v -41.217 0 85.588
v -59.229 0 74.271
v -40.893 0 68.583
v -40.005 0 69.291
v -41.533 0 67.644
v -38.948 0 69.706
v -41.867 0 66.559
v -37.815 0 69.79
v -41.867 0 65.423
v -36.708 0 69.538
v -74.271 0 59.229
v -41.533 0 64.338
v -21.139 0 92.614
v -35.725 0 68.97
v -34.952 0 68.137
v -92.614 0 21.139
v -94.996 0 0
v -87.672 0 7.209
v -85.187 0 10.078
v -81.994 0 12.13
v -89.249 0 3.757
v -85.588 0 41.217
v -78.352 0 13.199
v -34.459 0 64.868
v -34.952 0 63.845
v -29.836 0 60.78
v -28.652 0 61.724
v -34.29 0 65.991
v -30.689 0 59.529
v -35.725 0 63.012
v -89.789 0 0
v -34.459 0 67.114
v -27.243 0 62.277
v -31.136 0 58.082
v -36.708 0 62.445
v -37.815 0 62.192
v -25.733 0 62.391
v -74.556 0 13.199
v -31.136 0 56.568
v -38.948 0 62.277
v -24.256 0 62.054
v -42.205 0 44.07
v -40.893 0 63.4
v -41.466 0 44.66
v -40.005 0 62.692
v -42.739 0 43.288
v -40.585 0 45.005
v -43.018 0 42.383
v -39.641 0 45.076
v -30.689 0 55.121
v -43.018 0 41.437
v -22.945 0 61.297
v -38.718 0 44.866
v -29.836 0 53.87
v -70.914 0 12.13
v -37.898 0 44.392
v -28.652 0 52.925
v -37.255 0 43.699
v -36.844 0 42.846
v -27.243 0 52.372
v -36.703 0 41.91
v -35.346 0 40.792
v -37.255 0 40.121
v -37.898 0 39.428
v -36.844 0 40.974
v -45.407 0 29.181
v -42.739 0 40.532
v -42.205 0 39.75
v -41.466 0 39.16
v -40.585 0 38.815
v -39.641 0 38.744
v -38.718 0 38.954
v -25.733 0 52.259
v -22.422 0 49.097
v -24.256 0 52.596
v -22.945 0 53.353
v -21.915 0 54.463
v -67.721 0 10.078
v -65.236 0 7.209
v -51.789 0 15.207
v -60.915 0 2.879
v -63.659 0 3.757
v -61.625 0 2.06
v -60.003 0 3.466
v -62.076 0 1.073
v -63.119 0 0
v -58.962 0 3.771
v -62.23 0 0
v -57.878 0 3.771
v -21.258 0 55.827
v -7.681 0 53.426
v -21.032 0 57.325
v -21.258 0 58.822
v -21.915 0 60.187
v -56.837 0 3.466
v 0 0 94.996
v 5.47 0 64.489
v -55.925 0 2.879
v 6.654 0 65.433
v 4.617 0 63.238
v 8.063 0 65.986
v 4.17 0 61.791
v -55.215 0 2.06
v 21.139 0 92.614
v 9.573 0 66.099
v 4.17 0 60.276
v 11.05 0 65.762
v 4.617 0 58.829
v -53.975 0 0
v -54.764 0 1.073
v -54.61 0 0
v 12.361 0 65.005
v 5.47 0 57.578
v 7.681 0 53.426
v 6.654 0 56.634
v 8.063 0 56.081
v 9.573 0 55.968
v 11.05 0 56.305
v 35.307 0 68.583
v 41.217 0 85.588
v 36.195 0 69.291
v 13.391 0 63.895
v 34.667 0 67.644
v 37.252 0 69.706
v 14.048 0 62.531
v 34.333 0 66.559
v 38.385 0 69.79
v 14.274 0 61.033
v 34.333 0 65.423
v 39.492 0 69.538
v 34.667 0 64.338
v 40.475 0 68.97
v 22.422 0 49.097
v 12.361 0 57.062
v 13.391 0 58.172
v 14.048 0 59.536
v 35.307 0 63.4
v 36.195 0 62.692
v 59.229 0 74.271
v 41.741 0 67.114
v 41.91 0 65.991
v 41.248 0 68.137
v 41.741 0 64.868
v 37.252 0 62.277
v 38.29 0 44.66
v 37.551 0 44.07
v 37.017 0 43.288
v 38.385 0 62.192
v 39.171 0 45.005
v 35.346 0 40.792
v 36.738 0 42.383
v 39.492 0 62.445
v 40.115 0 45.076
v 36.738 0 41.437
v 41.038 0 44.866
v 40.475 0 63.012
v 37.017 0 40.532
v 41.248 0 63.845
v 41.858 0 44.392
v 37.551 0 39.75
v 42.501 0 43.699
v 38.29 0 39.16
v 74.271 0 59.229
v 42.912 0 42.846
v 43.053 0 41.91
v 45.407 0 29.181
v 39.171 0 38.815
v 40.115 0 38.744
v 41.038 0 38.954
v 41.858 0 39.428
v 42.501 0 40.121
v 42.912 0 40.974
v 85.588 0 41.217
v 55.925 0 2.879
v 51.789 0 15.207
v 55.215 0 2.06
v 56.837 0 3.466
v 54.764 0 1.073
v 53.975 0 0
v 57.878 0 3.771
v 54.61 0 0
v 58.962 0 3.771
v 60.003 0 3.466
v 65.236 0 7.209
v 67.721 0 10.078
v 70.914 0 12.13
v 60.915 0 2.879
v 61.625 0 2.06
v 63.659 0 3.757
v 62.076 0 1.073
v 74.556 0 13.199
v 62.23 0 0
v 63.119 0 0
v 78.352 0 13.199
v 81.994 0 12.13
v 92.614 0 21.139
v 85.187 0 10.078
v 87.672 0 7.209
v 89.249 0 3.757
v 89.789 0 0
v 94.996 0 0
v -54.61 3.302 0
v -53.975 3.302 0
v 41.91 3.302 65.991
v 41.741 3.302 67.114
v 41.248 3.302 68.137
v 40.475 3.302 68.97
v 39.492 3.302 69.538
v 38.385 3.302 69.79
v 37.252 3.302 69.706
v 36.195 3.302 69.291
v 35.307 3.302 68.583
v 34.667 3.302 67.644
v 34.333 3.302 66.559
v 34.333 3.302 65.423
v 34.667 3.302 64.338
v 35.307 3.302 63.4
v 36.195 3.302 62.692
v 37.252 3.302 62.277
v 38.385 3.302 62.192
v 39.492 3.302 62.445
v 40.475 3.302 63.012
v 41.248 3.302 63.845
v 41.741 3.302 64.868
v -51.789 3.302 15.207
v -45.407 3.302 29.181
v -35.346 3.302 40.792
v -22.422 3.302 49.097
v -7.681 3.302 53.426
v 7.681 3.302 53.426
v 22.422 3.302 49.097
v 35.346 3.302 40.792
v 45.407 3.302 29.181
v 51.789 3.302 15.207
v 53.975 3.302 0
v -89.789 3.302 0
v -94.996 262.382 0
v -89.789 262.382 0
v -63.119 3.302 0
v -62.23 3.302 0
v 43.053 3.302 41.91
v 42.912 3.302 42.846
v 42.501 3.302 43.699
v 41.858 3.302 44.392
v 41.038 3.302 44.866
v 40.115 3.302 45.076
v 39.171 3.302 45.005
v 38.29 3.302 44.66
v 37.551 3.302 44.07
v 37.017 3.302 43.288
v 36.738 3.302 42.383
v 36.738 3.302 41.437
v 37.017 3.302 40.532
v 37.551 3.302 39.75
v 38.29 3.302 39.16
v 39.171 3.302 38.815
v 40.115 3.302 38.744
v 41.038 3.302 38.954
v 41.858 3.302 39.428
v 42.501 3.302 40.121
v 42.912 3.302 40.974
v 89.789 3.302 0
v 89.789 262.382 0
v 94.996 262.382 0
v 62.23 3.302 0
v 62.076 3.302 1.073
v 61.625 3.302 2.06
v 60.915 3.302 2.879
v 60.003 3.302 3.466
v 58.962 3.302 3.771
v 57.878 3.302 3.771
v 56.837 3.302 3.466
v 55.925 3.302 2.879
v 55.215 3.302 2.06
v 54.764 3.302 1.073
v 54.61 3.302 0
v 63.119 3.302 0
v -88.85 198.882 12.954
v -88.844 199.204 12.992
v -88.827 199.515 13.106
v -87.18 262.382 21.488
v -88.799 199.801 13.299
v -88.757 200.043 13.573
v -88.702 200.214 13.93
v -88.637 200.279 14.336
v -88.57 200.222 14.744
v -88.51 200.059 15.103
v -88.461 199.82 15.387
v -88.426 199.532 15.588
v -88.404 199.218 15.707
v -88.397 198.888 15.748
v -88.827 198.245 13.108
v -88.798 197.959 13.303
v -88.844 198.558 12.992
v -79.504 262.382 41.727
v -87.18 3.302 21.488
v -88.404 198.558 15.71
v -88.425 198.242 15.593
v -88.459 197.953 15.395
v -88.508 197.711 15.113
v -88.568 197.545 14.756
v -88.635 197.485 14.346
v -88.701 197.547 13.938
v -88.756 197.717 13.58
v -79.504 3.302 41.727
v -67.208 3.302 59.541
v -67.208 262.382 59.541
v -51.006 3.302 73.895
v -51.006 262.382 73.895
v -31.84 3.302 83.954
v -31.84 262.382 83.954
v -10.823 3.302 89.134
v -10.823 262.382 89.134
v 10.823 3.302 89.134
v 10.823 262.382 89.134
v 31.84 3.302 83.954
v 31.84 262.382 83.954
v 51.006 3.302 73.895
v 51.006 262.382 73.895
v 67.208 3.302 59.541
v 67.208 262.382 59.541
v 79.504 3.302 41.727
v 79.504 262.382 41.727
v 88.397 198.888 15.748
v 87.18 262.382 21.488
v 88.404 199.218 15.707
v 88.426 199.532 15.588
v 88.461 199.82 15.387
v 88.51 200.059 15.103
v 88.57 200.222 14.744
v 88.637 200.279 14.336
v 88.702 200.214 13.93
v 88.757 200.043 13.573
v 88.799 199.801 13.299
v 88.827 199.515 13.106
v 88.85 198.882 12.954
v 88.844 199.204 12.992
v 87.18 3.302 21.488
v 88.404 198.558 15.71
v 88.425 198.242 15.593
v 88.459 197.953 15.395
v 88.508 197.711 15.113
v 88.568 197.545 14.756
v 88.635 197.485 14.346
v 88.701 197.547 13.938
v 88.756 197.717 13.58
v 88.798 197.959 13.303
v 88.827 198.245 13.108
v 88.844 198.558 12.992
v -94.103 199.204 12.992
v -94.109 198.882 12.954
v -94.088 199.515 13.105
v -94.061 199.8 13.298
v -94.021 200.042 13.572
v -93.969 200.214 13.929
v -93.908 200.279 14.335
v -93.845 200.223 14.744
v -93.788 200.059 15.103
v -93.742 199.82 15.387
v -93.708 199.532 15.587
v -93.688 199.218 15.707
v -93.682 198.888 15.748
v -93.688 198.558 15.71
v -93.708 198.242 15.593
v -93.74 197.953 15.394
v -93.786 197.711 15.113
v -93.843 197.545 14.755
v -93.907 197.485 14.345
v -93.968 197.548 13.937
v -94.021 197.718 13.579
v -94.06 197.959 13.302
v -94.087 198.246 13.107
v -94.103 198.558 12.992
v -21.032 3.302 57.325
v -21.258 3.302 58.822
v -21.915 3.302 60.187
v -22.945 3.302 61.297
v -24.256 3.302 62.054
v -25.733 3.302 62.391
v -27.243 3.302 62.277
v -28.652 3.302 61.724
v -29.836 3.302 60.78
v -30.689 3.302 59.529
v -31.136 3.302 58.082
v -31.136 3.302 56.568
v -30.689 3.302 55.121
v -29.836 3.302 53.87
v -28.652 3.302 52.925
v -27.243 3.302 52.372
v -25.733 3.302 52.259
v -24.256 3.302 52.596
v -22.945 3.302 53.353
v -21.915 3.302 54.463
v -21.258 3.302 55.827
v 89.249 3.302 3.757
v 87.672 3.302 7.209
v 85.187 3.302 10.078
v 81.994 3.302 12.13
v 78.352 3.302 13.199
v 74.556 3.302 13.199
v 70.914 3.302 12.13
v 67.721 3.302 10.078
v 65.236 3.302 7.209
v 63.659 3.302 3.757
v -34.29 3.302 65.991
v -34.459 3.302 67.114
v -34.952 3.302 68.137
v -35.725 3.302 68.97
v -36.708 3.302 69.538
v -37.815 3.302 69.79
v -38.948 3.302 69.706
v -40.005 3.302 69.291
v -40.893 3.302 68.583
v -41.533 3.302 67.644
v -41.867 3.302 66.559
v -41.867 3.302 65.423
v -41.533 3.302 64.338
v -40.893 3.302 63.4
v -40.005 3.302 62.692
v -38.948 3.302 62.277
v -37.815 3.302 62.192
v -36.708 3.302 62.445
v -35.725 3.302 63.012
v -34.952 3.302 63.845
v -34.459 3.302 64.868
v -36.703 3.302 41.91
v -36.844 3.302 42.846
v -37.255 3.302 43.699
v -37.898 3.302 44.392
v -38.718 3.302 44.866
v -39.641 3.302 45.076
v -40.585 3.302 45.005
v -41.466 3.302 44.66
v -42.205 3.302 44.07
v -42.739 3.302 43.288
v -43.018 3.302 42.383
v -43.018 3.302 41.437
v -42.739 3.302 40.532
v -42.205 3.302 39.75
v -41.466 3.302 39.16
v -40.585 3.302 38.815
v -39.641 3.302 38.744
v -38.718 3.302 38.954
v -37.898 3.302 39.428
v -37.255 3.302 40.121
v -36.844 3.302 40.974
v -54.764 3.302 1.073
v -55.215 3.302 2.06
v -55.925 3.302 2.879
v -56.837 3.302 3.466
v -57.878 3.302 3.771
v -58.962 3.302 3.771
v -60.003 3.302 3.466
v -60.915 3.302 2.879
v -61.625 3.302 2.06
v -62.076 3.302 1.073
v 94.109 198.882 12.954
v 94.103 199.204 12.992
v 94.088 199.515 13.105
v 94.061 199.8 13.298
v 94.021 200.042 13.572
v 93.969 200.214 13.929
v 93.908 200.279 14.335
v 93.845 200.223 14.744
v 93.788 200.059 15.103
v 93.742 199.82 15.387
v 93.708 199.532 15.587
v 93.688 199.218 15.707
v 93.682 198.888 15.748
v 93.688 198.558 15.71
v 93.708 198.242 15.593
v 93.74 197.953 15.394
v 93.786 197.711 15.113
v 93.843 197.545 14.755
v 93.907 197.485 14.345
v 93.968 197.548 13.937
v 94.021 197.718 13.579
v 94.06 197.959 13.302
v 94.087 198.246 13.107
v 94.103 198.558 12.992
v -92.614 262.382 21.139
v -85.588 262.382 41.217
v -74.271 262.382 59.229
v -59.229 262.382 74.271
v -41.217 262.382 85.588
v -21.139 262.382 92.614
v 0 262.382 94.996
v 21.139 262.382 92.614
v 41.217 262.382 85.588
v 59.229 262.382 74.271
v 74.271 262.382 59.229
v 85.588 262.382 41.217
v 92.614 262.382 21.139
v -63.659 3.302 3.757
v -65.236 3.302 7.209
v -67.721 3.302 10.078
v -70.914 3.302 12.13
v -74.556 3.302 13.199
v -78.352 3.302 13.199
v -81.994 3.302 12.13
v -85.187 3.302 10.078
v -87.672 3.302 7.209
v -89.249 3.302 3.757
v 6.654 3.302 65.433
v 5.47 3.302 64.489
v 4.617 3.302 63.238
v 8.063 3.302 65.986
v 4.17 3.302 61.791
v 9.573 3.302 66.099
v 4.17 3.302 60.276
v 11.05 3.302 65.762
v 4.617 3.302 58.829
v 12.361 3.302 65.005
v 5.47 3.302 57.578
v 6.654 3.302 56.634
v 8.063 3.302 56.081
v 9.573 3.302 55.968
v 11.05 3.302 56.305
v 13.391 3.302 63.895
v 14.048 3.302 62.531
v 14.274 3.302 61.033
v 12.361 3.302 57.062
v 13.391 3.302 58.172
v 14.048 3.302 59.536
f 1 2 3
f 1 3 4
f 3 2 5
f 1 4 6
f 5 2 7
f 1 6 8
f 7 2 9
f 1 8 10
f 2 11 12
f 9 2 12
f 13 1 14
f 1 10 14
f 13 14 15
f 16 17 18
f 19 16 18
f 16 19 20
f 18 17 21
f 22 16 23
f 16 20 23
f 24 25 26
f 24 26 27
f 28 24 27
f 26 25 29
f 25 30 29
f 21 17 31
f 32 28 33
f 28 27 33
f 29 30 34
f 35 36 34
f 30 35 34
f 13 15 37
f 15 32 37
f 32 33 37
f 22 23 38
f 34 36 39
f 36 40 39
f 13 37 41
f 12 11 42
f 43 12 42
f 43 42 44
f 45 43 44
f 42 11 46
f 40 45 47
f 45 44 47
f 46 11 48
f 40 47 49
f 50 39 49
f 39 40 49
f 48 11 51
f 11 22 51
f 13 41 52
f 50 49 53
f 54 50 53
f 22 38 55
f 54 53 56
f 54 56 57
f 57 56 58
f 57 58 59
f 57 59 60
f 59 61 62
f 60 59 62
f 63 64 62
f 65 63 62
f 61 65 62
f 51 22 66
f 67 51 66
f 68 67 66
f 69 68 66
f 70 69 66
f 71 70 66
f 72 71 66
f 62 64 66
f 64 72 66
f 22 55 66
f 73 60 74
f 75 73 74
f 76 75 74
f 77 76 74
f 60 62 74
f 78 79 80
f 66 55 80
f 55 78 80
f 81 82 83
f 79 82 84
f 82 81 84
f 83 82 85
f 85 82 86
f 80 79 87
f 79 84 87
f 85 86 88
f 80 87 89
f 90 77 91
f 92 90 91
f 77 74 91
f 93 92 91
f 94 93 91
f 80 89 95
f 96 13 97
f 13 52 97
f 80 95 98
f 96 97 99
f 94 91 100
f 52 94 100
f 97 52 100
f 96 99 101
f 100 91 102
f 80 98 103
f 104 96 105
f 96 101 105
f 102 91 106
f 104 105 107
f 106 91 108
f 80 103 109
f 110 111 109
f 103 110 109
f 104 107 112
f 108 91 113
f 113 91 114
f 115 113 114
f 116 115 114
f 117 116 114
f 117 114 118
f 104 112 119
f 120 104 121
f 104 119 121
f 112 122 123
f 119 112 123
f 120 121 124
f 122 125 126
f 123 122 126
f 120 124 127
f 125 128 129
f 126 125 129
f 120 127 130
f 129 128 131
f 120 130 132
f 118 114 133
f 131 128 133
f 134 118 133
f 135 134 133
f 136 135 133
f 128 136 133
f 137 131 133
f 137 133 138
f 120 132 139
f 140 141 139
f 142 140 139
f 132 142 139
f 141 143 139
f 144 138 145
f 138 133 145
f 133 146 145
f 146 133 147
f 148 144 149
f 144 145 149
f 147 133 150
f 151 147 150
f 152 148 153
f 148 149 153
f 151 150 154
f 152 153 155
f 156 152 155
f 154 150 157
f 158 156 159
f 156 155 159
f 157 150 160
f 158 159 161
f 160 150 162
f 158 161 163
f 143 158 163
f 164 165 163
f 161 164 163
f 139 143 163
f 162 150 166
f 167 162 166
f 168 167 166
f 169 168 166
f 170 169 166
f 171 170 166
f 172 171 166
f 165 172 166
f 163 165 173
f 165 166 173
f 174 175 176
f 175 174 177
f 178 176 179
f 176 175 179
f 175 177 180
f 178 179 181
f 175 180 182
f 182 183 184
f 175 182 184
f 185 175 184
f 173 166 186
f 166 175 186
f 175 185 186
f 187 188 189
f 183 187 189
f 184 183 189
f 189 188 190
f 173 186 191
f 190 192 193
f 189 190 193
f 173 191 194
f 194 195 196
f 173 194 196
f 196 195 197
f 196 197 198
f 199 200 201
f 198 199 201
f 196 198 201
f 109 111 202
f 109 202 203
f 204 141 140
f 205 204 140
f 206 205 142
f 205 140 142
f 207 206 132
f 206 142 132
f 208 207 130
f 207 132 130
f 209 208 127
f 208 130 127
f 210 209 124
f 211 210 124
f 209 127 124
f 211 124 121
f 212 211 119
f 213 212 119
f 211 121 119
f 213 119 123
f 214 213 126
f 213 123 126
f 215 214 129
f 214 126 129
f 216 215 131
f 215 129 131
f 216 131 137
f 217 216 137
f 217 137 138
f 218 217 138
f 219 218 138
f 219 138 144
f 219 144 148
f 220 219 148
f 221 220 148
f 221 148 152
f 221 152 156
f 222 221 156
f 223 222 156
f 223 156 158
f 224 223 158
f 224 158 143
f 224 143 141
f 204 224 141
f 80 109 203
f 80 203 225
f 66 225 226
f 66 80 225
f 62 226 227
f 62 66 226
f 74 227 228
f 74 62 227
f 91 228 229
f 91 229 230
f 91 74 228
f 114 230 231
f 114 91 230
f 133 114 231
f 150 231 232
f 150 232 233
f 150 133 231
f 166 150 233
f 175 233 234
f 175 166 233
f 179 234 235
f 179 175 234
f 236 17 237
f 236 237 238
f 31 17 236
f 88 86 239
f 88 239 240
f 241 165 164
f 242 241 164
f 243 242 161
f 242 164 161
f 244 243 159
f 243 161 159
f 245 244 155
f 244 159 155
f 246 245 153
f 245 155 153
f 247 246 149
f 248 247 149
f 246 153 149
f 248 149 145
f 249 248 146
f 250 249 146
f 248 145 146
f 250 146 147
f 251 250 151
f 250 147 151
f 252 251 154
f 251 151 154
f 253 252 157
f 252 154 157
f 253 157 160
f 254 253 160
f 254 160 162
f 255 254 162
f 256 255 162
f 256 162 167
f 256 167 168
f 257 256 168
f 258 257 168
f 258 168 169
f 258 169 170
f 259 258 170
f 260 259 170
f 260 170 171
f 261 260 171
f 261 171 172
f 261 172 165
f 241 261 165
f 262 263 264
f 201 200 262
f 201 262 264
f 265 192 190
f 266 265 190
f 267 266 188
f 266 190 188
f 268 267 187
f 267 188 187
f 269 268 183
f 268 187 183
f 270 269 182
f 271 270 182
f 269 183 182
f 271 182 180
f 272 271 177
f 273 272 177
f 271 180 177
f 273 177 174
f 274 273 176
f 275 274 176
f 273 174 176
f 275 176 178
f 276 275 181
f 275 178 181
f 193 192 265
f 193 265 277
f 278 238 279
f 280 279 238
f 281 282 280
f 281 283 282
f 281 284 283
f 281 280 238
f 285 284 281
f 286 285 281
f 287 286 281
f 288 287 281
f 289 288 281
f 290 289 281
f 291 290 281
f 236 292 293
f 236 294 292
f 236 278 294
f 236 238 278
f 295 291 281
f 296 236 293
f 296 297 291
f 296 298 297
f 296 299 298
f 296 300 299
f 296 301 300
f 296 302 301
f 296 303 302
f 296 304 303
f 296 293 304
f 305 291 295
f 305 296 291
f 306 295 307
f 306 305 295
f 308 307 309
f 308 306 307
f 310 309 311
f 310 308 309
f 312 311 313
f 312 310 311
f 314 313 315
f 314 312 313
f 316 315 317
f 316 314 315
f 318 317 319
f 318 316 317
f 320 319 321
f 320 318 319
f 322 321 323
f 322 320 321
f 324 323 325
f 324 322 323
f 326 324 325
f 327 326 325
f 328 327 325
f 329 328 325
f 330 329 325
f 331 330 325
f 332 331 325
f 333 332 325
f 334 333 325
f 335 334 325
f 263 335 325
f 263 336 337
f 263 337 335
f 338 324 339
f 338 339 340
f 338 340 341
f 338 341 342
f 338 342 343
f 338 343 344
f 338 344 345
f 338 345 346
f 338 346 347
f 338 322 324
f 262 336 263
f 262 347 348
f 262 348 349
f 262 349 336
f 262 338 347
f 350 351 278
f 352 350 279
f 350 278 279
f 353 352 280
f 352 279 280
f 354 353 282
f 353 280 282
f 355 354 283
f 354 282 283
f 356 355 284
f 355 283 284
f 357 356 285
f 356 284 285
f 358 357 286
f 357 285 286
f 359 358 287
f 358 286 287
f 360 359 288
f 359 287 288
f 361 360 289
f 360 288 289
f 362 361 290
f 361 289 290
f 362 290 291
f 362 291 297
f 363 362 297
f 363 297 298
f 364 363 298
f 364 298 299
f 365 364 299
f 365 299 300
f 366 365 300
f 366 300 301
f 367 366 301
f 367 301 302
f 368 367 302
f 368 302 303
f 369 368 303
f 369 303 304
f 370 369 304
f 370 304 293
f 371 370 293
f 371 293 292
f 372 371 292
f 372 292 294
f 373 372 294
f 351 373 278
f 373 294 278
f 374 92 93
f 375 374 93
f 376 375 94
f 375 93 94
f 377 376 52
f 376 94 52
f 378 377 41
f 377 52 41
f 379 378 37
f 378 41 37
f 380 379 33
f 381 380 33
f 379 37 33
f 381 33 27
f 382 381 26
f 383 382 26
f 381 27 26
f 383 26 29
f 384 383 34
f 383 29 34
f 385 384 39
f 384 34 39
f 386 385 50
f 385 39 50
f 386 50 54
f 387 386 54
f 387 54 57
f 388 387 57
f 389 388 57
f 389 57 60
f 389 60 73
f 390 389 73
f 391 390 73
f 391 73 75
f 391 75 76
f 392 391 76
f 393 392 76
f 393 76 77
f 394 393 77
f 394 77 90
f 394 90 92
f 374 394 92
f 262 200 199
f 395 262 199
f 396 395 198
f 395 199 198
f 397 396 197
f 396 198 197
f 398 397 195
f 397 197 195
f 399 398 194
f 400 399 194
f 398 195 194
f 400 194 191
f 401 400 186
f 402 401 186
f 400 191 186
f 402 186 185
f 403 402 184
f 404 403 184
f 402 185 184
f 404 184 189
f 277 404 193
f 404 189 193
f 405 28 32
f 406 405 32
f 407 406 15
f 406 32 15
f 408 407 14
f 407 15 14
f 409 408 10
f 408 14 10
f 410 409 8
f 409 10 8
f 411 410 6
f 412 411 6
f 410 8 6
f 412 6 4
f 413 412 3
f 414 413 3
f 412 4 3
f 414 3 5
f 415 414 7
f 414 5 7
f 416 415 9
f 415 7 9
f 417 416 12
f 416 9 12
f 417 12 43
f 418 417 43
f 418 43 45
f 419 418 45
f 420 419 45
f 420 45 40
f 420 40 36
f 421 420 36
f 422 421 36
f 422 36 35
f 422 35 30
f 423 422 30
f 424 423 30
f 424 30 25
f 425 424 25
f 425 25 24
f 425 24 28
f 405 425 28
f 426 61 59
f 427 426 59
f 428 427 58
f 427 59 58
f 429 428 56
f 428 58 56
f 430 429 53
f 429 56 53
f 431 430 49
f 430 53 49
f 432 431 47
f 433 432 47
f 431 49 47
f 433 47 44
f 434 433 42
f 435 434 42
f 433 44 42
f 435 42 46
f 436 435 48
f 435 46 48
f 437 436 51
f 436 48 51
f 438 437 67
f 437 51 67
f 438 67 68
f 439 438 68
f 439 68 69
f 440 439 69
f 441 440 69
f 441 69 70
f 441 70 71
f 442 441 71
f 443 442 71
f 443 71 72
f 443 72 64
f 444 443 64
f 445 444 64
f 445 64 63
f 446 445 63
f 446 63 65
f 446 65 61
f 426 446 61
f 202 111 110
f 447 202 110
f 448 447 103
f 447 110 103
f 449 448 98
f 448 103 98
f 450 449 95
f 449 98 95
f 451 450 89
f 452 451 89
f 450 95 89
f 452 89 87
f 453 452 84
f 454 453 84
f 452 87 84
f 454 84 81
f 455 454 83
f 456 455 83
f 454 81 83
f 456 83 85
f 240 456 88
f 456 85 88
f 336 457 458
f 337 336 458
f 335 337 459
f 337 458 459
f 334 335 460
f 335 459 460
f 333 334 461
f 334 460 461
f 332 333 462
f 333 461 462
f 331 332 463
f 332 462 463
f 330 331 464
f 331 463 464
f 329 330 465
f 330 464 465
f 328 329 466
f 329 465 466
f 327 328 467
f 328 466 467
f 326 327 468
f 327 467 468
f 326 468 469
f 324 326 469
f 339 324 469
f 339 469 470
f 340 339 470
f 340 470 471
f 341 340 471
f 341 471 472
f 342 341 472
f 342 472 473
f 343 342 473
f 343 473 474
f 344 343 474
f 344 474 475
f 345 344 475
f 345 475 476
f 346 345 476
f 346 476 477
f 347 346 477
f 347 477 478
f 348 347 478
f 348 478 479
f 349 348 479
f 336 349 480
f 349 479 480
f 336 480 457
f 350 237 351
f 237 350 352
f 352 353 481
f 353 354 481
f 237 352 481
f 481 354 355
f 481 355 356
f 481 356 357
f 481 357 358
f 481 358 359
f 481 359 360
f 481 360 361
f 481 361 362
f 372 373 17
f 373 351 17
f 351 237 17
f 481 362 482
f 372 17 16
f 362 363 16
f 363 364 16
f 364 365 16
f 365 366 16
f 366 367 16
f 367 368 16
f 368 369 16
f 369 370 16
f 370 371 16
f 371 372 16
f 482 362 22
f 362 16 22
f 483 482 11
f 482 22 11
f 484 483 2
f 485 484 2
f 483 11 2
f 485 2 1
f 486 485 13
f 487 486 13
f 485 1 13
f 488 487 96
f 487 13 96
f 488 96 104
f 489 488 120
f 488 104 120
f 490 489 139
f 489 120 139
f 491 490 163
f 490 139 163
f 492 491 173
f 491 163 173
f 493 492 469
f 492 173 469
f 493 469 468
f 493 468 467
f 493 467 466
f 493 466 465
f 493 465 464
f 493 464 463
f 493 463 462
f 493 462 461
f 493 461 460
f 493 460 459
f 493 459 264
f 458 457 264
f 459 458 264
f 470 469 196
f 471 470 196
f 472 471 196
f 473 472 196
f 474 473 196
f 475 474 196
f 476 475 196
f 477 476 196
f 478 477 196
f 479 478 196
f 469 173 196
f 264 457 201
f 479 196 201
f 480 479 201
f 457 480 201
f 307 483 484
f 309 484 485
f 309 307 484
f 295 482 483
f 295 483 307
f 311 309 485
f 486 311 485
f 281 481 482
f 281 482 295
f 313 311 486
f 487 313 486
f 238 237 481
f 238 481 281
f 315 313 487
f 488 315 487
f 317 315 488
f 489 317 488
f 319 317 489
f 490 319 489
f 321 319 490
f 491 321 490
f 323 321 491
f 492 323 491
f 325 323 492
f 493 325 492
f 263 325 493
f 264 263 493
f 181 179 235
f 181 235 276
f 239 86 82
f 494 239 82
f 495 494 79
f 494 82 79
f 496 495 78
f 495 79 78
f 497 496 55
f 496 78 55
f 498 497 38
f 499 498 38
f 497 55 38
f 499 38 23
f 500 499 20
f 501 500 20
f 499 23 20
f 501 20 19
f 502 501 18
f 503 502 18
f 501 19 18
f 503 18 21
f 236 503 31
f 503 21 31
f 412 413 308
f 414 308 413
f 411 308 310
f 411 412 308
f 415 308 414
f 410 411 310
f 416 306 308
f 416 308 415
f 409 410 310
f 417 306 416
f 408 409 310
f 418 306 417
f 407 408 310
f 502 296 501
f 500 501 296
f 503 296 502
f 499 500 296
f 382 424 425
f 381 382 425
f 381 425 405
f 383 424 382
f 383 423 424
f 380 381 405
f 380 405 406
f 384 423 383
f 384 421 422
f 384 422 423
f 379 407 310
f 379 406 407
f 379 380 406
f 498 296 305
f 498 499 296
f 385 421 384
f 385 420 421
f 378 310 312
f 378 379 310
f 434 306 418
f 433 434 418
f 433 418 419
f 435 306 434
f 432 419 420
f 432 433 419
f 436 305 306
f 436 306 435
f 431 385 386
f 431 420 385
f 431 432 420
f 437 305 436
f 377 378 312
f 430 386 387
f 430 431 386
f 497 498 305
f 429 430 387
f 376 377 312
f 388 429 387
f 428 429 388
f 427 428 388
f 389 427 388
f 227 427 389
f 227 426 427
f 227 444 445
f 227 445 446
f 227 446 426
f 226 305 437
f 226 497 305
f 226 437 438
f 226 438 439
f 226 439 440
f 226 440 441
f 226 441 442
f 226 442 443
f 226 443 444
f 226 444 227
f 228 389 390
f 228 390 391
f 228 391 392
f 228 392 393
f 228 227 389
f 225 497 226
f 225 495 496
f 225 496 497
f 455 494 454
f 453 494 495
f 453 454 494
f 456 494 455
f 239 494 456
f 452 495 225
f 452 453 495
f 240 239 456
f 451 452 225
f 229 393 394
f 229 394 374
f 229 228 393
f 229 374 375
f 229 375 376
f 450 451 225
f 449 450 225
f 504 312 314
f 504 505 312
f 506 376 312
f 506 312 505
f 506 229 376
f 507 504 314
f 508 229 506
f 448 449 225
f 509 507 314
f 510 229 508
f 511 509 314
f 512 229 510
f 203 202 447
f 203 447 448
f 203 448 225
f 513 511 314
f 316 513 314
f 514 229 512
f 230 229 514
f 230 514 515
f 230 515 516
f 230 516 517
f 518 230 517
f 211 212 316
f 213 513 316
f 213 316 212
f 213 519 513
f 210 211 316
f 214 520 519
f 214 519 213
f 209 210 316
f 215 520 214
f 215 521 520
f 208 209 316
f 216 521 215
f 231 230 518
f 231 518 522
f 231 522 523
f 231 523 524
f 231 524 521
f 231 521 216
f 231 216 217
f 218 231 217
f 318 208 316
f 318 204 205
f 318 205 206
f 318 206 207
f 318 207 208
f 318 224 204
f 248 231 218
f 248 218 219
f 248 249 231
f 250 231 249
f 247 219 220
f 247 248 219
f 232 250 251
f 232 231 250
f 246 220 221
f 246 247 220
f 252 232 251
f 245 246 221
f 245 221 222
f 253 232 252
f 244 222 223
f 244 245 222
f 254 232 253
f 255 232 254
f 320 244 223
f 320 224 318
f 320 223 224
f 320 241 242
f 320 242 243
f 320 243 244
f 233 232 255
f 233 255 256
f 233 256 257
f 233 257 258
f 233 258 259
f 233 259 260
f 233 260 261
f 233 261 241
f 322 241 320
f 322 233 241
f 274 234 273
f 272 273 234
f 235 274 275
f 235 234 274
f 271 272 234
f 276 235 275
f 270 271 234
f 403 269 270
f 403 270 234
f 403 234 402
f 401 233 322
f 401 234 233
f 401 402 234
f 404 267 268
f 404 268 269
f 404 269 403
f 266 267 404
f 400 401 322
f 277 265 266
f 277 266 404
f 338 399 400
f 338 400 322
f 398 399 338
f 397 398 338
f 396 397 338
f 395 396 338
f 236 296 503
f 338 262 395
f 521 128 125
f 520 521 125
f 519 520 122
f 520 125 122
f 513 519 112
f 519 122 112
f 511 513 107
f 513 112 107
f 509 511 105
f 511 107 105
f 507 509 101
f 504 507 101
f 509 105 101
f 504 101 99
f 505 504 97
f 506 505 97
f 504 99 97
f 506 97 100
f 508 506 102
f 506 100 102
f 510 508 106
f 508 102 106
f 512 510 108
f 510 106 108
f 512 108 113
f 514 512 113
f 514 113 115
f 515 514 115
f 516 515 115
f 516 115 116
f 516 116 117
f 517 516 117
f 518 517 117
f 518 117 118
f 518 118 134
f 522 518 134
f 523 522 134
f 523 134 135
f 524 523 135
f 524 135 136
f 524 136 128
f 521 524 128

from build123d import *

# Parameters (mm, degrees)
SKETCH1_R               = 94.996
SKETCH1_R_2             = 53.975
TOP_OF_HATCH_DEPTH      = 3.302
SKETCH2_R               = 94.996
SKETCH2_R_2             = 89.789
HATCH_BODY_DEPTH        = 259.08
SKETCH3_R               = 13.335
CHARGE_TUBE_HOLES_DEPTH = 263.382
SKETCH4_R               = 3.81
BOLT_HOLES_DEPTH        = 263.382
SKETCH_5_R              = 5.08
ANTENNA_HOLES_DEPTH     = 263.382
SKETCH5_R               = 3.81
SKETCH5_R_2             = 3.175
INNER_SCREW_HOLES_DEPTH = 263.382
SKETCH8_R               = 1.397
CUT_EXTRUDE1_DEPTH      = 190.992
CUT_EXTRUDE4_DEPTH      = 263.3820001


with BuildPart() as part:
    # Sketch1 → Top of Hatch (new body)
    with BuildSketch(Plane(origin=(0, 0, 0), x_dir=(1, 0, 0), z_dir=(0, 1, 0))):
        Circle(SKETCH1_R)
        Circle(SKETCH1_R_2, mode=Mode.SUBTRACT)
    extrude(amount=TOP_OF_HATCH_DEPTH)

    # Sketch2 → Hatch Body (add)
    with BuildSketch(Plane(origin=(0, 3.302, 0), x_dir=(1, 0, 0), z_dir=(0, 1, 0))):
        Circle(SKETCH2_R)
        Circle(SKETCH2_R_2, mode=Mode.SUBTRACT)
    extrude(amount=HATCH_BODY_DEPTH)

    # Sketch3 → Charge Tube Holes (cut, through all)
    with BuildSketch(Plane.XZ):
        with Locations((-76.454, 0)):
            Circle(SKETCH3_R)
        with Locations((76.454, 0)):
            Circle(SKETCH3_R)
    extrude(amount=-CHARGE_TUBE_HOLES_DEPTH, mode=Mode.SUBTRACT)

    # Sketch4 → Bolt Holes (cut, through all)
    with BuildSketch(Plane.XZ):
        with Locations((-38.1, -65.991135768)):
            Circle(SKETCH4_R)
        with Locations((-38.1, 65.991135768)):
            Circle(SKETCH4_R)
        with Locations((38.1, 65.991135768)):
            Circle(SKETCH4_R)
        with Locations((38.1, -65.991135768)):
            Circle(SKETCH4_R)
    extrude(amount=-BOLT_HOLES_DEPTH, mode=Mode.SUBTRACT)

    # Sketch 5 → Antenna Holes (cut, through all)
    with BuildSketch(Plane.XZ):
        with Locations((-26.112352144, 57.324838678)):
            Circle(SKETCH_5_R)
        with Locations((9.193647856, 61.033450854)):
            Circle(SKETCH_5_R)
    extrude(amount=-ANTENNA_HOLES_DEPTH, mode=Mode.SUBTRACT)

    # Sketch5 → Inner Screw Holes (cut, through all)
    with BuildSketch(Plane.XZ):
        with Locations((58.42, 0)):
            Circle(SKETCH5_R)
        with Locations((-58.42, 0)):
            Circle(SKETCH5_R)
        with Locations((39.878, 41.91)):
            Circle(SKETCH5_R_2)
        with Locations((-39.878, 41.91)):
            Circle(SKETCH5_R_2)
        with Locations((39.878, -41.91)):
            Circle(SKETCH5_R_2)
        with Locations((-39.878, -41.91)):
            Circle(SKETCH5_R_2)
    extrude(amount=-INNER_SCREW_HOLES_DEPTH, mode=Mode.SUBTRACT)

    # Sketch8 → Cut-Extrude1 (cut, through all)
    with BuildSketch(Plane(origin=(94.996, 0, 0), x_dir=(0, 0, -1), z_dir=(1, 0, 0))):
        with Locations((14.351, 198.882)):
            Circle(SKETCH8_R)
        with Locations((-14.351, 198.882)):
            Circle(SKETCH8_R)
    extrude(amount=-CUT_EXTRUDE1_DEPTH, mode=Mode.SUBTRACT)

    # Sketch12 → Cut-Extrude4 (cut, through all)
    with BuildSketch(Plane.XZ):
        with BuildLine():
            Line((-94.996, 0), (94.996, 0))
            ThreePointArc((94.996, 0), (0, -94.996), (-94.996, 0))
        make_face()
    extrude(amount=-CUT_EXTRUDE4_DEPTH, mode=Mode.SUBTRACT)


solid = part.part
